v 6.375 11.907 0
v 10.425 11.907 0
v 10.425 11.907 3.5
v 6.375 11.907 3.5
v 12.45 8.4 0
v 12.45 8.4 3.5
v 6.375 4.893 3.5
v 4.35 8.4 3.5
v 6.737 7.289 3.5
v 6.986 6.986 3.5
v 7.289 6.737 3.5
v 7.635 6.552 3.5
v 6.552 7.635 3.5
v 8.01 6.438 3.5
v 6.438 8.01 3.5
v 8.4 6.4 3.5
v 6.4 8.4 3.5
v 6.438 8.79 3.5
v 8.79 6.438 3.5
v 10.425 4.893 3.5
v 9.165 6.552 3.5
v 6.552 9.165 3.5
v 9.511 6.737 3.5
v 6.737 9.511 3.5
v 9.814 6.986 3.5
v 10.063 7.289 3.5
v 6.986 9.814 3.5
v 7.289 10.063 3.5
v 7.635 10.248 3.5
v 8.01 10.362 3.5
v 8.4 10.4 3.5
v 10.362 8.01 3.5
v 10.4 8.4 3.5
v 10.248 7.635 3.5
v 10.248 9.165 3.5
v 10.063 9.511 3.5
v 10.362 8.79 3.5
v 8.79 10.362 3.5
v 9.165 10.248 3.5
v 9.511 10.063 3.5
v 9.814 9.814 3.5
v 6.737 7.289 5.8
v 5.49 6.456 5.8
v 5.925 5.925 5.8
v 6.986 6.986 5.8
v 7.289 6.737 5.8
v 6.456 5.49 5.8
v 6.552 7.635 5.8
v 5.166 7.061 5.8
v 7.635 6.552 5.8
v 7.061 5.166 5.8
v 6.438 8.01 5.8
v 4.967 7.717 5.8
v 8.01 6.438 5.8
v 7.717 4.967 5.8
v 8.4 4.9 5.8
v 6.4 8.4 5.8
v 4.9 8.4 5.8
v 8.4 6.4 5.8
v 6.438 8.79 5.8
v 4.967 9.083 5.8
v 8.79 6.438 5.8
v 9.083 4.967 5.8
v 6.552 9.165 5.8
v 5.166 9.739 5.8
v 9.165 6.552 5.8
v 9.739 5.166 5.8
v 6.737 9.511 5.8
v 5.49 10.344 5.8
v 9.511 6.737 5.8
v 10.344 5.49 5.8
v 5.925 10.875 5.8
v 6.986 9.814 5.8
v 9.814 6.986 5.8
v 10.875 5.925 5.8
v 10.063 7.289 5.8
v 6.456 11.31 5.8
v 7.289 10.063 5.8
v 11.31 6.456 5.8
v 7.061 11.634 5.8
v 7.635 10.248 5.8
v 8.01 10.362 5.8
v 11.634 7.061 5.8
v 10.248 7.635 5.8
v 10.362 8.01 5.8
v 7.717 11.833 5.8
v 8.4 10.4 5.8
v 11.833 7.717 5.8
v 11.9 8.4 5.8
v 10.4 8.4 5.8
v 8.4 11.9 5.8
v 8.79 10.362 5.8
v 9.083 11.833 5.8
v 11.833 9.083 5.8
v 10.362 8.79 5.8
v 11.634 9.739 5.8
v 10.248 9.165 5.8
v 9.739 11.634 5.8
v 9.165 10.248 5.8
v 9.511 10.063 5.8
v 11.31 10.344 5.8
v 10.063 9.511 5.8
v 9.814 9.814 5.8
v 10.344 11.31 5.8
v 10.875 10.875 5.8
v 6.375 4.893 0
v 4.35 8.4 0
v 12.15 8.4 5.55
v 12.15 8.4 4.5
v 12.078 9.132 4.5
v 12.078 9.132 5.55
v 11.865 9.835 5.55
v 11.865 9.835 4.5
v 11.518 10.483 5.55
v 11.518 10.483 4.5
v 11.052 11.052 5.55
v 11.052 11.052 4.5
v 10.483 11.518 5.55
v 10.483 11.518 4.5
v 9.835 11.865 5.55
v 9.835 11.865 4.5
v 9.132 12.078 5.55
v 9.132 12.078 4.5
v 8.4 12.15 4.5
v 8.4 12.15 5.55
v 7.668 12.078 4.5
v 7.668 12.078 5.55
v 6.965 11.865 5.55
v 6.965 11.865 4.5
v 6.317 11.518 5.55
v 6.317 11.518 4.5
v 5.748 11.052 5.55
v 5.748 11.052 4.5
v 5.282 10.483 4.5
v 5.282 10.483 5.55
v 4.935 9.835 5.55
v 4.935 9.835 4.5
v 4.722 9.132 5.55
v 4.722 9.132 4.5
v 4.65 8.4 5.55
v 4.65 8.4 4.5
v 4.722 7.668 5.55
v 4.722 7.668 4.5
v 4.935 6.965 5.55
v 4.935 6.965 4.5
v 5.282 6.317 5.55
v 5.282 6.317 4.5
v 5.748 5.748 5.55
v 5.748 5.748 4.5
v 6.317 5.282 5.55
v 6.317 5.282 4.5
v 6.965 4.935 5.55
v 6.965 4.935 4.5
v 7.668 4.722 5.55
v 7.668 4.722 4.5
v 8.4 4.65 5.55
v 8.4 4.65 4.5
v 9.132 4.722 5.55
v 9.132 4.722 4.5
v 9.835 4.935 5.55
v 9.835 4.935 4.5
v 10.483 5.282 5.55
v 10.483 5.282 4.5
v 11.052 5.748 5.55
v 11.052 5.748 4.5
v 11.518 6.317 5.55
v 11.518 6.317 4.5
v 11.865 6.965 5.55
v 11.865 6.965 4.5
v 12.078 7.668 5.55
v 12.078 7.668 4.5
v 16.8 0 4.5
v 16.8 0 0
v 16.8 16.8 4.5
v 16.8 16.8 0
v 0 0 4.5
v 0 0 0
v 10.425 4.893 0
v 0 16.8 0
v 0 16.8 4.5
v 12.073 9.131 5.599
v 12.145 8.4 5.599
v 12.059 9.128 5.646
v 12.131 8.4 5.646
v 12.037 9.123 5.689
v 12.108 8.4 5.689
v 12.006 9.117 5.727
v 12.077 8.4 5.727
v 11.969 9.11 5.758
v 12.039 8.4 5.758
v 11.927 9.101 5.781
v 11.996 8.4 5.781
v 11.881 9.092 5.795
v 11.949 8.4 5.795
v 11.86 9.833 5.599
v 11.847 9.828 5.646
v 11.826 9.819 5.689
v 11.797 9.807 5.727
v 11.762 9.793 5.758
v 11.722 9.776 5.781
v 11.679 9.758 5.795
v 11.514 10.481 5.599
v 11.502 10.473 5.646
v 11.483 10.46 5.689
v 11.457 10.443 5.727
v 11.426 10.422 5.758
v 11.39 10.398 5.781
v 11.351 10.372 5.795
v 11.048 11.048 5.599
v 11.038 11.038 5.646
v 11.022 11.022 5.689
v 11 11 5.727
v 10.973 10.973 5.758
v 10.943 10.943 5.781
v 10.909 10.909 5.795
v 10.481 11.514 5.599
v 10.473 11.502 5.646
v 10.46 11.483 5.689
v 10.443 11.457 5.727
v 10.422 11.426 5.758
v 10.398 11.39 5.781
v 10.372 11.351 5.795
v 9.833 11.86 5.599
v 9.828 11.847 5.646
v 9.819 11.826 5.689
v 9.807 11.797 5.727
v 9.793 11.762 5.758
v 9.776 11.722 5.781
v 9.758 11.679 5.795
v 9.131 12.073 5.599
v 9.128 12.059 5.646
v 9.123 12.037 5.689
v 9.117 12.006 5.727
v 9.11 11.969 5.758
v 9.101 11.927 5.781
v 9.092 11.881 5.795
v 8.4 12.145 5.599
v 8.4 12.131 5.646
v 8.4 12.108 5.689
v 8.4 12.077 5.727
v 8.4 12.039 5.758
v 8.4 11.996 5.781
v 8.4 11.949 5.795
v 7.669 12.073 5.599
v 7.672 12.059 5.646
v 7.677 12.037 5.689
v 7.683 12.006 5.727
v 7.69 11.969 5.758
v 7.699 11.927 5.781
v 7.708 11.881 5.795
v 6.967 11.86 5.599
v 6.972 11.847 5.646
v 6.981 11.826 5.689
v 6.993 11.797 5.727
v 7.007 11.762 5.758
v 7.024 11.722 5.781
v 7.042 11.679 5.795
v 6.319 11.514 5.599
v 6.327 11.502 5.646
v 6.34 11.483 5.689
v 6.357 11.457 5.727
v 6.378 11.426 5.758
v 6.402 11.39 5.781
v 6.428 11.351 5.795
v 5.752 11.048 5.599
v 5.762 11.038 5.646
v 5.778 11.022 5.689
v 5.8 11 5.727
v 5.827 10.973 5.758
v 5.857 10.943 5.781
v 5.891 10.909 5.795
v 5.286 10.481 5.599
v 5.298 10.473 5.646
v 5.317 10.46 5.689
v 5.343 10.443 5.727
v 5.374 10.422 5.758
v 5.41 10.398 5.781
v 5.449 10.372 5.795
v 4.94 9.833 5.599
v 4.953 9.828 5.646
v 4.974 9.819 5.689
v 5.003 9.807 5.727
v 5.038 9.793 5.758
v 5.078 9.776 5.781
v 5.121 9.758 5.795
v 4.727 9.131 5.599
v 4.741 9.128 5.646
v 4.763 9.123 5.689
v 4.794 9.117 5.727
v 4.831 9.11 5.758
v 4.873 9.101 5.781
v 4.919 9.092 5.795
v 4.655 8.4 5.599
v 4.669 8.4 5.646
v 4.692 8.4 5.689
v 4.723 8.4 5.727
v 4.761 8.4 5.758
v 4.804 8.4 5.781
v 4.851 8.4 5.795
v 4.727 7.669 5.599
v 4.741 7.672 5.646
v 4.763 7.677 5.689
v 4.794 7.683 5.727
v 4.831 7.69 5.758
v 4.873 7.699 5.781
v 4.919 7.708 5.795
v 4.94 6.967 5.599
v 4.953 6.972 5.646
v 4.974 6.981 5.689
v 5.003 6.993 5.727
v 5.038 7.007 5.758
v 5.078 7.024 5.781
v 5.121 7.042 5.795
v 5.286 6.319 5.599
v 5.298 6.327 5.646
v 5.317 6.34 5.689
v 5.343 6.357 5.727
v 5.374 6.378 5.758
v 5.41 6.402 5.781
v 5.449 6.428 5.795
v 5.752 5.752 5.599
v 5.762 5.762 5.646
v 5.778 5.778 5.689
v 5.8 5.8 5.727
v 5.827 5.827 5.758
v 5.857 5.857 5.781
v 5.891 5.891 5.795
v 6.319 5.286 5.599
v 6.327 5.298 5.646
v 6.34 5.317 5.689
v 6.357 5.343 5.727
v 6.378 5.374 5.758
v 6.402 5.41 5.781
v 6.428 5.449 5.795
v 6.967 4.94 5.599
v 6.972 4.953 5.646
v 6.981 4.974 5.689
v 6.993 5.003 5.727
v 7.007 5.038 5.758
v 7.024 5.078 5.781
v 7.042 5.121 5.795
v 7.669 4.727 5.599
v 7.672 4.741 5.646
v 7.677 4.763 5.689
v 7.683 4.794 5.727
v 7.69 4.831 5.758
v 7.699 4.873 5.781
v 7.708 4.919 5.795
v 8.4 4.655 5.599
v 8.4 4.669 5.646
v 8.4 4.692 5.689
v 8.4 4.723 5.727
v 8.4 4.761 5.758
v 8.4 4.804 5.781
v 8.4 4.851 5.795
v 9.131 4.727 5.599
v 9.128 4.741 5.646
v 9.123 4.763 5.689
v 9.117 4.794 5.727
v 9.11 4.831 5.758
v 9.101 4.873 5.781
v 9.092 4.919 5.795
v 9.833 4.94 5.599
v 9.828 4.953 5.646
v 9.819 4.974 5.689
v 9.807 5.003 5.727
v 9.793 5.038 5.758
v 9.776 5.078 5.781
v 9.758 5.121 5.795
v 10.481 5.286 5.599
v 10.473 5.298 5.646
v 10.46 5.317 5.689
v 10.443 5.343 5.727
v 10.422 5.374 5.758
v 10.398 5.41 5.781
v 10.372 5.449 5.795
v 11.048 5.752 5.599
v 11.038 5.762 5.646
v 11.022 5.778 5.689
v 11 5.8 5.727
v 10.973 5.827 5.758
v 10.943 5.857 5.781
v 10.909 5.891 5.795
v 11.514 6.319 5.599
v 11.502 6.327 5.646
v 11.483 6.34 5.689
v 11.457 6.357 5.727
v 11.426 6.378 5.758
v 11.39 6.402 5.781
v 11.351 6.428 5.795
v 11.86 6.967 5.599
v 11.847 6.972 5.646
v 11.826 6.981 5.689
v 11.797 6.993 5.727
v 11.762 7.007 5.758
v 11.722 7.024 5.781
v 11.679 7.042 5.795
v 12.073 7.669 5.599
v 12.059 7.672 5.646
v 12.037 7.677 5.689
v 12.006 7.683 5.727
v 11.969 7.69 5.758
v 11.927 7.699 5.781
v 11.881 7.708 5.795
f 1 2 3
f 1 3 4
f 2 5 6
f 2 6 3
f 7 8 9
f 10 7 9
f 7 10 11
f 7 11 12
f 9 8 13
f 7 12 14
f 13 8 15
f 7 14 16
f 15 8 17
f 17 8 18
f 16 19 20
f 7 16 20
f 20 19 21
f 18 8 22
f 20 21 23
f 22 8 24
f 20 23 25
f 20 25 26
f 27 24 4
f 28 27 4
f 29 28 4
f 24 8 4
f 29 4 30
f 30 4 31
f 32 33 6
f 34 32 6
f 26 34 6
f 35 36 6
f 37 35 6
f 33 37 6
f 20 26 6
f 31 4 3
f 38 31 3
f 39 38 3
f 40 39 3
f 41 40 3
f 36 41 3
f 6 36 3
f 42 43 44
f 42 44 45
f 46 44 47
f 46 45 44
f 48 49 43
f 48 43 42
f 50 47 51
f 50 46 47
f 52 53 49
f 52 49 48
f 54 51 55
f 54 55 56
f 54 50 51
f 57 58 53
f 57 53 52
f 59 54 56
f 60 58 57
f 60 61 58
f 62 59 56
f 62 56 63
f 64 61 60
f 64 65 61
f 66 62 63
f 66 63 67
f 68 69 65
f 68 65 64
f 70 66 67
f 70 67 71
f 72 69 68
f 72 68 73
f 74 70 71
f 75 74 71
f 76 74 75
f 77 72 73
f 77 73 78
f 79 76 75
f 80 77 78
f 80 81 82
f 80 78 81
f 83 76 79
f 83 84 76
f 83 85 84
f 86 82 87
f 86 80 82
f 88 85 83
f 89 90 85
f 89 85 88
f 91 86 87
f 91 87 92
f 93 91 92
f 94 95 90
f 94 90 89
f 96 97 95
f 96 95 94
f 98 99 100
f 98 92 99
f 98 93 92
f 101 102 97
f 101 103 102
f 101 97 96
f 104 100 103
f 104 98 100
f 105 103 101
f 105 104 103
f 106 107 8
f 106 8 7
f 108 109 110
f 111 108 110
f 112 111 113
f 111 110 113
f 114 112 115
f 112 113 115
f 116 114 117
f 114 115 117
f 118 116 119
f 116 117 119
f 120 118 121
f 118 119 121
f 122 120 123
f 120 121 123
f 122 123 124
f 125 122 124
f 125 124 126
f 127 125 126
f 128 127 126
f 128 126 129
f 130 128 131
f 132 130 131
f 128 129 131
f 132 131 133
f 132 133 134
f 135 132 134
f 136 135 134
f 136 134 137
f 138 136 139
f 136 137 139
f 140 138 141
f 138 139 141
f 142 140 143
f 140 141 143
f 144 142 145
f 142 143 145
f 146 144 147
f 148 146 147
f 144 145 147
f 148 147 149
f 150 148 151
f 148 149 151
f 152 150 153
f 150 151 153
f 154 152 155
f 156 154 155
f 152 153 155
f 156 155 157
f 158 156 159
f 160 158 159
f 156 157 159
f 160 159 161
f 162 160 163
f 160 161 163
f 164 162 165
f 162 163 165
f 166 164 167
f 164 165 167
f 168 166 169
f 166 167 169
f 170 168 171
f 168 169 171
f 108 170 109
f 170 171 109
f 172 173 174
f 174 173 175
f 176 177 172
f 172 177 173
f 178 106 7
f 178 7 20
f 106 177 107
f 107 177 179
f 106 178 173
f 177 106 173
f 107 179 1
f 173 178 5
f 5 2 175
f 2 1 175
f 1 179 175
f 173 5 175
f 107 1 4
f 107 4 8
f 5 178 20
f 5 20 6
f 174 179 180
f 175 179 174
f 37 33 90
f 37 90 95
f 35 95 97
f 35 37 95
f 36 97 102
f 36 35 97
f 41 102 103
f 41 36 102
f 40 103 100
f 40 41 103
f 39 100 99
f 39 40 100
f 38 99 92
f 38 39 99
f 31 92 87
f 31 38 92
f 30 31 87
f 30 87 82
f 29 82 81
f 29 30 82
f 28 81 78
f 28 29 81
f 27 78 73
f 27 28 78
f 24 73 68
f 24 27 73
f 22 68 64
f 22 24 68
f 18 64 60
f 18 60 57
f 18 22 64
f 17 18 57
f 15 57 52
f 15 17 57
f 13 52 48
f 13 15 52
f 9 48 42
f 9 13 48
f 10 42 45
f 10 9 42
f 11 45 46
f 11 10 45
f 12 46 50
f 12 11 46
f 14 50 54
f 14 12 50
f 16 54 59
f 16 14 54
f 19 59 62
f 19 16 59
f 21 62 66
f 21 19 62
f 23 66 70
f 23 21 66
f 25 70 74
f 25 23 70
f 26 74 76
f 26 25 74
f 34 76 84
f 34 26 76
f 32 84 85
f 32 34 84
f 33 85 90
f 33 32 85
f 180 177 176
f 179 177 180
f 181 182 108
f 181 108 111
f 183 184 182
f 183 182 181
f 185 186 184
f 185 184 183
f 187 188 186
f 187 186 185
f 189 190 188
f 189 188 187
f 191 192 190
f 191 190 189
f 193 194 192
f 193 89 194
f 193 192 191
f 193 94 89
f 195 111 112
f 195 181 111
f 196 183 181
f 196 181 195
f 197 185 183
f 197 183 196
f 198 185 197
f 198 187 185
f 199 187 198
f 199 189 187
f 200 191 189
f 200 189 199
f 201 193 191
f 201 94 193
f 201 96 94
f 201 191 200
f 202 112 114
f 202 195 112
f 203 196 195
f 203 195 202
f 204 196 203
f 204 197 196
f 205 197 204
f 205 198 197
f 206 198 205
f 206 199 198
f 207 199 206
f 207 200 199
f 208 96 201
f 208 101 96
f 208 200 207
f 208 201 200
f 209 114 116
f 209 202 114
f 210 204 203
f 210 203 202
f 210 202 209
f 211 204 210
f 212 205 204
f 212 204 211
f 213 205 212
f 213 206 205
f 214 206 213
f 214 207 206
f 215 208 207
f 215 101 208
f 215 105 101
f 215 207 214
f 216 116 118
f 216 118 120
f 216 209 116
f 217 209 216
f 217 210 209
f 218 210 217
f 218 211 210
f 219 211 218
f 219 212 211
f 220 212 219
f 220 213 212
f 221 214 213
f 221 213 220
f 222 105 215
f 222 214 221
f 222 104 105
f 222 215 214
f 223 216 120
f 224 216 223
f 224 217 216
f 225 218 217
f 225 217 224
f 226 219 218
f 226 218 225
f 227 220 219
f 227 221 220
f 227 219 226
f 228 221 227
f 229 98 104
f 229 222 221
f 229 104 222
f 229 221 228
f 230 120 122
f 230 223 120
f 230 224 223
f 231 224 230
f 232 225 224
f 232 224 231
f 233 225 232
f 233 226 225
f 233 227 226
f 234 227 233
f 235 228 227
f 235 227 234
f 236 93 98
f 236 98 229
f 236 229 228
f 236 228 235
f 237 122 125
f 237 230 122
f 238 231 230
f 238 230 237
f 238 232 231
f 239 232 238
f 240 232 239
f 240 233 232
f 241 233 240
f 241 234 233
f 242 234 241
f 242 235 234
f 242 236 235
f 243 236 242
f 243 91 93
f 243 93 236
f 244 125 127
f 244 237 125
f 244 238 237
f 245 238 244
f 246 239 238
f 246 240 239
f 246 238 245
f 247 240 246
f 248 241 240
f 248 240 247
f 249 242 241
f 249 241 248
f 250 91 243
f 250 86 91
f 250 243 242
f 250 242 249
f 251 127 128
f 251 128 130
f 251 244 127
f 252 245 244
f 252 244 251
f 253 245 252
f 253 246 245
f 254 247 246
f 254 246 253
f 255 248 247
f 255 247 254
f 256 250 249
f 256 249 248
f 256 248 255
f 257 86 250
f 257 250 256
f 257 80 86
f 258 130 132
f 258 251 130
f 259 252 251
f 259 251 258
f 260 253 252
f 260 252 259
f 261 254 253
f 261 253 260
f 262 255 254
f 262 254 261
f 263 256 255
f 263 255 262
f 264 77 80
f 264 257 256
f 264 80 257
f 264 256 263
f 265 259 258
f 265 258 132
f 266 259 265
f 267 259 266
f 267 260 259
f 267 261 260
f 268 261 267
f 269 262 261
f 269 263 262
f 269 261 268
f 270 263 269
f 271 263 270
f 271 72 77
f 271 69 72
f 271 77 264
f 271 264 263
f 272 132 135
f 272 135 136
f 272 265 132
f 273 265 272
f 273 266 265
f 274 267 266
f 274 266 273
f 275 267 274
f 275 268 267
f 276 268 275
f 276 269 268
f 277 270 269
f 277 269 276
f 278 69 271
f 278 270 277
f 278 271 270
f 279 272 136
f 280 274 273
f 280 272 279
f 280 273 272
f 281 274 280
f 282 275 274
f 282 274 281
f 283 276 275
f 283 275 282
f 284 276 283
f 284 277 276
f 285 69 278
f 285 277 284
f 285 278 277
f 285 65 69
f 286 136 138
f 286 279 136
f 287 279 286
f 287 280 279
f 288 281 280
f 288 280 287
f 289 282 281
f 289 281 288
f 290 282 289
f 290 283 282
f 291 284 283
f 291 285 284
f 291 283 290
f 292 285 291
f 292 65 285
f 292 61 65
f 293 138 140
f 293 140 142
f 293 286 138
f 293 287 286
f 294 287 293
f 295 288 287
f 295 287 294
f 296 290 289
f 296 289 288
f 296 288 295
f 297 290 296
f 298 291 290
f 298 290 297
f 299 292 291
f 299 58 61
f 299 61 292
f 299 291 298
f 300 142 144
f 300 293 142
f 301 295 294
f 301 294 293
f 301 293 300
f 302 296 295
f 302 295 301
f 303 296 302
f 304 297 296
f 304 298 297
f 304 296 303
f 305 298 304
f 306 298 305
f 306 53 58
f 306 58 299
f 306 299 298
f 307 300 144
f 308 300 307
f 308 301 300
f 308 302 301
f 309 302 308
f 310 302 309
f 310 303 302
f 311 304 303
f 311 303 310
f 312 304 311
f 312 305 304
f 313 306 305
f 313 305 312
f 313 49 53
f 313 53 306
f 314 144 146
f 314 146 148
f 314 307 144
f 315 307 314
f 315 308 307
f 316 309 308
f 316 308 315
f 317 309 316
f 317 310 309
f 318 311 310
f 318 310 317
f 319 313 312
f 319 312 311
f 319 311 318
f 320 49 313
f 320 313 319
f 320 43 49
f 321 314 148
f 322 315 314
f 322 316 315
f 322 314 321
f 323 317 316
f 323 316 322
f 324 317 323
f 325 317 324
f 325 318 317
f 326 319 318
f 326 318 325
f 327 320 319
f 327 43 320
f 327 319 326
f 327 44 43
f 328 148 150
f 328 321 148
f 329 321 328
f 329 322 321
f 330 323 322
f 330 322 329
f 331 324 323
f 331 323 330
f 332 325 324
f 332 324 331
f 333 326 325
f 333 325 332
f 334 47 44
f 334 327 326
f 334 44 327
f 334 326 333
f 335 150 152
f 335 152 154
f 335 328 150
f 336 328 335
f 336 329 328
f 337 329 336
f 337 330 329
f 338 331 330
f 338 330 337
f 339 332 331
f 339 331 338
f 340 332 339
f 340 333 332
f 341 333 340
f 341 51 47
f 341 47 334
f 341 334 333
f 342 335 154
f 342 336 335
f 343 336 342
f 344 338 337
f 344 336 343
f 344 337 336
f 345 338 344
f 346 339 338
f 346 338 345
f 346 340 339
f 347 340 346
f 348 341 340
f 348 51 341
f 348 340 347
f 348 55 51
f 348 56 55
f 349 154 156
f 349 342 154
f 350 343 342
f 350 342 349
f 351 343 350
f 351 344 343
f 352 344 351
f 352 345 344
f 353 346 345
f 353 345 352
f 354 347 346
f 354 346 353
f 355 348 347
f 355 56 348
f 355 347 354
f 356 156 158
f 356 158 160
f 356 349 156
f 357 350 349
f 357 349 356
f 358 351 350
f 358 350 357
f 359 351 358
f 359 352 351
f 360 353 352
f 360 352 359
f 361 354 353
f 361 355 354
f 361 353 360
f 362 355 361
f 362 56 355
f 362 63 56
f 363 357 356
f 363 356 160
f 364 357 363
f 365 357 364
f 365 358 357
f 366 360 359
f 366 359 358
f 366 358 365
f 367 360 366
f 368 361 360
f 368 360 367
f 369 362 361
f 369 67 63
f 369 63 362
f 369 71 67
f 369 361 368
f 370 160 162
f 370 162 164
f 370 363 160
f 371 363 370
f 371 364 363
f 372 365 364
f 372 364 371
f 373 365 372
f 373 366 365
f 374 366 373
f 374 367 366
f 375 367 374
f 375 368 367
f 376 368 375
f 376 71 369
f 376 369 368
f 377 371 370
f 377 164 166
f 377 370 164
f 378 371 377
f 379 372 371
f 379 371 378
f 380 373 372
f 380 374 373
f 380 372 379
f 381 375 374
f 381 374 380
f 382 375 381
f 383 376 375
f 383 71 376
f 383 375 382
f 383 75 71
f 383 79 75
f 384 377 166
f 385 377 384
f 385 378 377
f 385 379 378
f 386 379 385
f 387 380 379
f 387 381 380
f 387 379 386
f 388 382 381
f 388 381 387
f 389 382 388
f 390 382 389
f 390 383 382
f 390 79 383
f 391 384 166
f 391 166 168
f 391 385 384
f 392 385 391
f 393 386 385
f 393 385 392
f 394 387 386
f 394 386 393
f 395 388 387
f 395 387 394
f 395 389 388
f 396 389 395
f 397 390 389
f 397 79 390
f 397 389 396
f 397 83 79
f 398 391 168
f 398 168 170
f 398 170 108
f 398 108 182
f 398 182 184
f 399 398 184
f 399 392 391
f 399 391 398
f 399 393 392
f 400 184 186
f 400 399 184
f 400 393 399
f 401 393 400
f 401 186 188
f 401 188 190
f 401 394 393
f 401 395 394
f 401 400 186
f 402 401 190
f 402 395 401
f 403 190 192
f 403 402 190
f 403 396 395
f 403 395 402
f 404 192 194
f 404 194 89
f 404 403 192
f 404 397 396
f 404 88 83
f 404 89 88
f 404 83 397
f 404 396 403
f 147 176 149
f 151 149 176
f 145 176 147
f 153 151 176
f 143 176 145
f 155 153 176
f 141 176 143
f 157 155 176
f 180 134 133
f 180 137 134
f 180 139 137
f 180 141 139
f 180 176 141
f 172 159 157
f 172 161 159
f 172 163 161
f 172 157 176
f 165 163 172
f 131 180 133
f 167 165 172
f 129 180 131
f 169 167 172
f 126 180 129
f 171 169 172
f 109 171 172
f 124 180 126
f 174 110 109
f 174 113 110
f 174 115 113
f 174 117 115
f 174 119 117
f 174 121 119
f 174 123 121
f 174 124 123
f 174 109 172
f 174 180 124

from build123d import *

# Parameters (mm, degrees)
SKETCH_W      = 16.8
SKETCH_H      = 16.8
SKETCH_R      = 2
PAD_DEPTH     = 4.5
SKETCH002_R   = 3.75
SKETCH002_R_2 = 2
PAD001_DEPTH  = 1.3
POCKET_DEPTH  = 3.5
FILLET_R      = 0.25


with BuildPart() as part:
    # Sketch → Pad (new body)
    with BuildSketch(Plane.XY):
        with Locations((8.4, 8.4)):
            Rectangle(SKETCH_W, SKETCH_H)
        with Locations((8.4, 8.4)):
            Circle(SKETCH_R, mode=Mode.SUBTRACT)
    extrude(amount=PAD_DEPTH)

    # Sketch002 (on Face7 of Pad) → Pad001 (join)
    with BuildSketch(Plane.XY.offset(4.5)):
        with Locations((8.4, 8.4)):
            Circle(SKETCH002_R)
        with Locations((8.4, 8.4)):
            Circle(SKETCH002_R_2, mode=Mode.SUBTRACT)
    extrude(amount=PAD001_DEPTH)

    # Sketch001 → Pocket (cut)
    with BuildSketch(Plane.XY):
        Polygon((12.45, 8.4), (10.425, 11.907403), (6.375, 11.907403), (4.35, 8.4), (6.375, 4.892597), (10.425, 4.892597), align=None)
    extrude(amount=POCKET_DEPTH, mode=Mode.SUBTRACT)

    # Fillet
    fillet_edges = [part.edges().sort_by_distance(p)[0] for p in [
        (4.65, 8.4, 5.8),
    ]]
    fillet(fillet_edges, radius=FILLET_R)


solid = part.part
